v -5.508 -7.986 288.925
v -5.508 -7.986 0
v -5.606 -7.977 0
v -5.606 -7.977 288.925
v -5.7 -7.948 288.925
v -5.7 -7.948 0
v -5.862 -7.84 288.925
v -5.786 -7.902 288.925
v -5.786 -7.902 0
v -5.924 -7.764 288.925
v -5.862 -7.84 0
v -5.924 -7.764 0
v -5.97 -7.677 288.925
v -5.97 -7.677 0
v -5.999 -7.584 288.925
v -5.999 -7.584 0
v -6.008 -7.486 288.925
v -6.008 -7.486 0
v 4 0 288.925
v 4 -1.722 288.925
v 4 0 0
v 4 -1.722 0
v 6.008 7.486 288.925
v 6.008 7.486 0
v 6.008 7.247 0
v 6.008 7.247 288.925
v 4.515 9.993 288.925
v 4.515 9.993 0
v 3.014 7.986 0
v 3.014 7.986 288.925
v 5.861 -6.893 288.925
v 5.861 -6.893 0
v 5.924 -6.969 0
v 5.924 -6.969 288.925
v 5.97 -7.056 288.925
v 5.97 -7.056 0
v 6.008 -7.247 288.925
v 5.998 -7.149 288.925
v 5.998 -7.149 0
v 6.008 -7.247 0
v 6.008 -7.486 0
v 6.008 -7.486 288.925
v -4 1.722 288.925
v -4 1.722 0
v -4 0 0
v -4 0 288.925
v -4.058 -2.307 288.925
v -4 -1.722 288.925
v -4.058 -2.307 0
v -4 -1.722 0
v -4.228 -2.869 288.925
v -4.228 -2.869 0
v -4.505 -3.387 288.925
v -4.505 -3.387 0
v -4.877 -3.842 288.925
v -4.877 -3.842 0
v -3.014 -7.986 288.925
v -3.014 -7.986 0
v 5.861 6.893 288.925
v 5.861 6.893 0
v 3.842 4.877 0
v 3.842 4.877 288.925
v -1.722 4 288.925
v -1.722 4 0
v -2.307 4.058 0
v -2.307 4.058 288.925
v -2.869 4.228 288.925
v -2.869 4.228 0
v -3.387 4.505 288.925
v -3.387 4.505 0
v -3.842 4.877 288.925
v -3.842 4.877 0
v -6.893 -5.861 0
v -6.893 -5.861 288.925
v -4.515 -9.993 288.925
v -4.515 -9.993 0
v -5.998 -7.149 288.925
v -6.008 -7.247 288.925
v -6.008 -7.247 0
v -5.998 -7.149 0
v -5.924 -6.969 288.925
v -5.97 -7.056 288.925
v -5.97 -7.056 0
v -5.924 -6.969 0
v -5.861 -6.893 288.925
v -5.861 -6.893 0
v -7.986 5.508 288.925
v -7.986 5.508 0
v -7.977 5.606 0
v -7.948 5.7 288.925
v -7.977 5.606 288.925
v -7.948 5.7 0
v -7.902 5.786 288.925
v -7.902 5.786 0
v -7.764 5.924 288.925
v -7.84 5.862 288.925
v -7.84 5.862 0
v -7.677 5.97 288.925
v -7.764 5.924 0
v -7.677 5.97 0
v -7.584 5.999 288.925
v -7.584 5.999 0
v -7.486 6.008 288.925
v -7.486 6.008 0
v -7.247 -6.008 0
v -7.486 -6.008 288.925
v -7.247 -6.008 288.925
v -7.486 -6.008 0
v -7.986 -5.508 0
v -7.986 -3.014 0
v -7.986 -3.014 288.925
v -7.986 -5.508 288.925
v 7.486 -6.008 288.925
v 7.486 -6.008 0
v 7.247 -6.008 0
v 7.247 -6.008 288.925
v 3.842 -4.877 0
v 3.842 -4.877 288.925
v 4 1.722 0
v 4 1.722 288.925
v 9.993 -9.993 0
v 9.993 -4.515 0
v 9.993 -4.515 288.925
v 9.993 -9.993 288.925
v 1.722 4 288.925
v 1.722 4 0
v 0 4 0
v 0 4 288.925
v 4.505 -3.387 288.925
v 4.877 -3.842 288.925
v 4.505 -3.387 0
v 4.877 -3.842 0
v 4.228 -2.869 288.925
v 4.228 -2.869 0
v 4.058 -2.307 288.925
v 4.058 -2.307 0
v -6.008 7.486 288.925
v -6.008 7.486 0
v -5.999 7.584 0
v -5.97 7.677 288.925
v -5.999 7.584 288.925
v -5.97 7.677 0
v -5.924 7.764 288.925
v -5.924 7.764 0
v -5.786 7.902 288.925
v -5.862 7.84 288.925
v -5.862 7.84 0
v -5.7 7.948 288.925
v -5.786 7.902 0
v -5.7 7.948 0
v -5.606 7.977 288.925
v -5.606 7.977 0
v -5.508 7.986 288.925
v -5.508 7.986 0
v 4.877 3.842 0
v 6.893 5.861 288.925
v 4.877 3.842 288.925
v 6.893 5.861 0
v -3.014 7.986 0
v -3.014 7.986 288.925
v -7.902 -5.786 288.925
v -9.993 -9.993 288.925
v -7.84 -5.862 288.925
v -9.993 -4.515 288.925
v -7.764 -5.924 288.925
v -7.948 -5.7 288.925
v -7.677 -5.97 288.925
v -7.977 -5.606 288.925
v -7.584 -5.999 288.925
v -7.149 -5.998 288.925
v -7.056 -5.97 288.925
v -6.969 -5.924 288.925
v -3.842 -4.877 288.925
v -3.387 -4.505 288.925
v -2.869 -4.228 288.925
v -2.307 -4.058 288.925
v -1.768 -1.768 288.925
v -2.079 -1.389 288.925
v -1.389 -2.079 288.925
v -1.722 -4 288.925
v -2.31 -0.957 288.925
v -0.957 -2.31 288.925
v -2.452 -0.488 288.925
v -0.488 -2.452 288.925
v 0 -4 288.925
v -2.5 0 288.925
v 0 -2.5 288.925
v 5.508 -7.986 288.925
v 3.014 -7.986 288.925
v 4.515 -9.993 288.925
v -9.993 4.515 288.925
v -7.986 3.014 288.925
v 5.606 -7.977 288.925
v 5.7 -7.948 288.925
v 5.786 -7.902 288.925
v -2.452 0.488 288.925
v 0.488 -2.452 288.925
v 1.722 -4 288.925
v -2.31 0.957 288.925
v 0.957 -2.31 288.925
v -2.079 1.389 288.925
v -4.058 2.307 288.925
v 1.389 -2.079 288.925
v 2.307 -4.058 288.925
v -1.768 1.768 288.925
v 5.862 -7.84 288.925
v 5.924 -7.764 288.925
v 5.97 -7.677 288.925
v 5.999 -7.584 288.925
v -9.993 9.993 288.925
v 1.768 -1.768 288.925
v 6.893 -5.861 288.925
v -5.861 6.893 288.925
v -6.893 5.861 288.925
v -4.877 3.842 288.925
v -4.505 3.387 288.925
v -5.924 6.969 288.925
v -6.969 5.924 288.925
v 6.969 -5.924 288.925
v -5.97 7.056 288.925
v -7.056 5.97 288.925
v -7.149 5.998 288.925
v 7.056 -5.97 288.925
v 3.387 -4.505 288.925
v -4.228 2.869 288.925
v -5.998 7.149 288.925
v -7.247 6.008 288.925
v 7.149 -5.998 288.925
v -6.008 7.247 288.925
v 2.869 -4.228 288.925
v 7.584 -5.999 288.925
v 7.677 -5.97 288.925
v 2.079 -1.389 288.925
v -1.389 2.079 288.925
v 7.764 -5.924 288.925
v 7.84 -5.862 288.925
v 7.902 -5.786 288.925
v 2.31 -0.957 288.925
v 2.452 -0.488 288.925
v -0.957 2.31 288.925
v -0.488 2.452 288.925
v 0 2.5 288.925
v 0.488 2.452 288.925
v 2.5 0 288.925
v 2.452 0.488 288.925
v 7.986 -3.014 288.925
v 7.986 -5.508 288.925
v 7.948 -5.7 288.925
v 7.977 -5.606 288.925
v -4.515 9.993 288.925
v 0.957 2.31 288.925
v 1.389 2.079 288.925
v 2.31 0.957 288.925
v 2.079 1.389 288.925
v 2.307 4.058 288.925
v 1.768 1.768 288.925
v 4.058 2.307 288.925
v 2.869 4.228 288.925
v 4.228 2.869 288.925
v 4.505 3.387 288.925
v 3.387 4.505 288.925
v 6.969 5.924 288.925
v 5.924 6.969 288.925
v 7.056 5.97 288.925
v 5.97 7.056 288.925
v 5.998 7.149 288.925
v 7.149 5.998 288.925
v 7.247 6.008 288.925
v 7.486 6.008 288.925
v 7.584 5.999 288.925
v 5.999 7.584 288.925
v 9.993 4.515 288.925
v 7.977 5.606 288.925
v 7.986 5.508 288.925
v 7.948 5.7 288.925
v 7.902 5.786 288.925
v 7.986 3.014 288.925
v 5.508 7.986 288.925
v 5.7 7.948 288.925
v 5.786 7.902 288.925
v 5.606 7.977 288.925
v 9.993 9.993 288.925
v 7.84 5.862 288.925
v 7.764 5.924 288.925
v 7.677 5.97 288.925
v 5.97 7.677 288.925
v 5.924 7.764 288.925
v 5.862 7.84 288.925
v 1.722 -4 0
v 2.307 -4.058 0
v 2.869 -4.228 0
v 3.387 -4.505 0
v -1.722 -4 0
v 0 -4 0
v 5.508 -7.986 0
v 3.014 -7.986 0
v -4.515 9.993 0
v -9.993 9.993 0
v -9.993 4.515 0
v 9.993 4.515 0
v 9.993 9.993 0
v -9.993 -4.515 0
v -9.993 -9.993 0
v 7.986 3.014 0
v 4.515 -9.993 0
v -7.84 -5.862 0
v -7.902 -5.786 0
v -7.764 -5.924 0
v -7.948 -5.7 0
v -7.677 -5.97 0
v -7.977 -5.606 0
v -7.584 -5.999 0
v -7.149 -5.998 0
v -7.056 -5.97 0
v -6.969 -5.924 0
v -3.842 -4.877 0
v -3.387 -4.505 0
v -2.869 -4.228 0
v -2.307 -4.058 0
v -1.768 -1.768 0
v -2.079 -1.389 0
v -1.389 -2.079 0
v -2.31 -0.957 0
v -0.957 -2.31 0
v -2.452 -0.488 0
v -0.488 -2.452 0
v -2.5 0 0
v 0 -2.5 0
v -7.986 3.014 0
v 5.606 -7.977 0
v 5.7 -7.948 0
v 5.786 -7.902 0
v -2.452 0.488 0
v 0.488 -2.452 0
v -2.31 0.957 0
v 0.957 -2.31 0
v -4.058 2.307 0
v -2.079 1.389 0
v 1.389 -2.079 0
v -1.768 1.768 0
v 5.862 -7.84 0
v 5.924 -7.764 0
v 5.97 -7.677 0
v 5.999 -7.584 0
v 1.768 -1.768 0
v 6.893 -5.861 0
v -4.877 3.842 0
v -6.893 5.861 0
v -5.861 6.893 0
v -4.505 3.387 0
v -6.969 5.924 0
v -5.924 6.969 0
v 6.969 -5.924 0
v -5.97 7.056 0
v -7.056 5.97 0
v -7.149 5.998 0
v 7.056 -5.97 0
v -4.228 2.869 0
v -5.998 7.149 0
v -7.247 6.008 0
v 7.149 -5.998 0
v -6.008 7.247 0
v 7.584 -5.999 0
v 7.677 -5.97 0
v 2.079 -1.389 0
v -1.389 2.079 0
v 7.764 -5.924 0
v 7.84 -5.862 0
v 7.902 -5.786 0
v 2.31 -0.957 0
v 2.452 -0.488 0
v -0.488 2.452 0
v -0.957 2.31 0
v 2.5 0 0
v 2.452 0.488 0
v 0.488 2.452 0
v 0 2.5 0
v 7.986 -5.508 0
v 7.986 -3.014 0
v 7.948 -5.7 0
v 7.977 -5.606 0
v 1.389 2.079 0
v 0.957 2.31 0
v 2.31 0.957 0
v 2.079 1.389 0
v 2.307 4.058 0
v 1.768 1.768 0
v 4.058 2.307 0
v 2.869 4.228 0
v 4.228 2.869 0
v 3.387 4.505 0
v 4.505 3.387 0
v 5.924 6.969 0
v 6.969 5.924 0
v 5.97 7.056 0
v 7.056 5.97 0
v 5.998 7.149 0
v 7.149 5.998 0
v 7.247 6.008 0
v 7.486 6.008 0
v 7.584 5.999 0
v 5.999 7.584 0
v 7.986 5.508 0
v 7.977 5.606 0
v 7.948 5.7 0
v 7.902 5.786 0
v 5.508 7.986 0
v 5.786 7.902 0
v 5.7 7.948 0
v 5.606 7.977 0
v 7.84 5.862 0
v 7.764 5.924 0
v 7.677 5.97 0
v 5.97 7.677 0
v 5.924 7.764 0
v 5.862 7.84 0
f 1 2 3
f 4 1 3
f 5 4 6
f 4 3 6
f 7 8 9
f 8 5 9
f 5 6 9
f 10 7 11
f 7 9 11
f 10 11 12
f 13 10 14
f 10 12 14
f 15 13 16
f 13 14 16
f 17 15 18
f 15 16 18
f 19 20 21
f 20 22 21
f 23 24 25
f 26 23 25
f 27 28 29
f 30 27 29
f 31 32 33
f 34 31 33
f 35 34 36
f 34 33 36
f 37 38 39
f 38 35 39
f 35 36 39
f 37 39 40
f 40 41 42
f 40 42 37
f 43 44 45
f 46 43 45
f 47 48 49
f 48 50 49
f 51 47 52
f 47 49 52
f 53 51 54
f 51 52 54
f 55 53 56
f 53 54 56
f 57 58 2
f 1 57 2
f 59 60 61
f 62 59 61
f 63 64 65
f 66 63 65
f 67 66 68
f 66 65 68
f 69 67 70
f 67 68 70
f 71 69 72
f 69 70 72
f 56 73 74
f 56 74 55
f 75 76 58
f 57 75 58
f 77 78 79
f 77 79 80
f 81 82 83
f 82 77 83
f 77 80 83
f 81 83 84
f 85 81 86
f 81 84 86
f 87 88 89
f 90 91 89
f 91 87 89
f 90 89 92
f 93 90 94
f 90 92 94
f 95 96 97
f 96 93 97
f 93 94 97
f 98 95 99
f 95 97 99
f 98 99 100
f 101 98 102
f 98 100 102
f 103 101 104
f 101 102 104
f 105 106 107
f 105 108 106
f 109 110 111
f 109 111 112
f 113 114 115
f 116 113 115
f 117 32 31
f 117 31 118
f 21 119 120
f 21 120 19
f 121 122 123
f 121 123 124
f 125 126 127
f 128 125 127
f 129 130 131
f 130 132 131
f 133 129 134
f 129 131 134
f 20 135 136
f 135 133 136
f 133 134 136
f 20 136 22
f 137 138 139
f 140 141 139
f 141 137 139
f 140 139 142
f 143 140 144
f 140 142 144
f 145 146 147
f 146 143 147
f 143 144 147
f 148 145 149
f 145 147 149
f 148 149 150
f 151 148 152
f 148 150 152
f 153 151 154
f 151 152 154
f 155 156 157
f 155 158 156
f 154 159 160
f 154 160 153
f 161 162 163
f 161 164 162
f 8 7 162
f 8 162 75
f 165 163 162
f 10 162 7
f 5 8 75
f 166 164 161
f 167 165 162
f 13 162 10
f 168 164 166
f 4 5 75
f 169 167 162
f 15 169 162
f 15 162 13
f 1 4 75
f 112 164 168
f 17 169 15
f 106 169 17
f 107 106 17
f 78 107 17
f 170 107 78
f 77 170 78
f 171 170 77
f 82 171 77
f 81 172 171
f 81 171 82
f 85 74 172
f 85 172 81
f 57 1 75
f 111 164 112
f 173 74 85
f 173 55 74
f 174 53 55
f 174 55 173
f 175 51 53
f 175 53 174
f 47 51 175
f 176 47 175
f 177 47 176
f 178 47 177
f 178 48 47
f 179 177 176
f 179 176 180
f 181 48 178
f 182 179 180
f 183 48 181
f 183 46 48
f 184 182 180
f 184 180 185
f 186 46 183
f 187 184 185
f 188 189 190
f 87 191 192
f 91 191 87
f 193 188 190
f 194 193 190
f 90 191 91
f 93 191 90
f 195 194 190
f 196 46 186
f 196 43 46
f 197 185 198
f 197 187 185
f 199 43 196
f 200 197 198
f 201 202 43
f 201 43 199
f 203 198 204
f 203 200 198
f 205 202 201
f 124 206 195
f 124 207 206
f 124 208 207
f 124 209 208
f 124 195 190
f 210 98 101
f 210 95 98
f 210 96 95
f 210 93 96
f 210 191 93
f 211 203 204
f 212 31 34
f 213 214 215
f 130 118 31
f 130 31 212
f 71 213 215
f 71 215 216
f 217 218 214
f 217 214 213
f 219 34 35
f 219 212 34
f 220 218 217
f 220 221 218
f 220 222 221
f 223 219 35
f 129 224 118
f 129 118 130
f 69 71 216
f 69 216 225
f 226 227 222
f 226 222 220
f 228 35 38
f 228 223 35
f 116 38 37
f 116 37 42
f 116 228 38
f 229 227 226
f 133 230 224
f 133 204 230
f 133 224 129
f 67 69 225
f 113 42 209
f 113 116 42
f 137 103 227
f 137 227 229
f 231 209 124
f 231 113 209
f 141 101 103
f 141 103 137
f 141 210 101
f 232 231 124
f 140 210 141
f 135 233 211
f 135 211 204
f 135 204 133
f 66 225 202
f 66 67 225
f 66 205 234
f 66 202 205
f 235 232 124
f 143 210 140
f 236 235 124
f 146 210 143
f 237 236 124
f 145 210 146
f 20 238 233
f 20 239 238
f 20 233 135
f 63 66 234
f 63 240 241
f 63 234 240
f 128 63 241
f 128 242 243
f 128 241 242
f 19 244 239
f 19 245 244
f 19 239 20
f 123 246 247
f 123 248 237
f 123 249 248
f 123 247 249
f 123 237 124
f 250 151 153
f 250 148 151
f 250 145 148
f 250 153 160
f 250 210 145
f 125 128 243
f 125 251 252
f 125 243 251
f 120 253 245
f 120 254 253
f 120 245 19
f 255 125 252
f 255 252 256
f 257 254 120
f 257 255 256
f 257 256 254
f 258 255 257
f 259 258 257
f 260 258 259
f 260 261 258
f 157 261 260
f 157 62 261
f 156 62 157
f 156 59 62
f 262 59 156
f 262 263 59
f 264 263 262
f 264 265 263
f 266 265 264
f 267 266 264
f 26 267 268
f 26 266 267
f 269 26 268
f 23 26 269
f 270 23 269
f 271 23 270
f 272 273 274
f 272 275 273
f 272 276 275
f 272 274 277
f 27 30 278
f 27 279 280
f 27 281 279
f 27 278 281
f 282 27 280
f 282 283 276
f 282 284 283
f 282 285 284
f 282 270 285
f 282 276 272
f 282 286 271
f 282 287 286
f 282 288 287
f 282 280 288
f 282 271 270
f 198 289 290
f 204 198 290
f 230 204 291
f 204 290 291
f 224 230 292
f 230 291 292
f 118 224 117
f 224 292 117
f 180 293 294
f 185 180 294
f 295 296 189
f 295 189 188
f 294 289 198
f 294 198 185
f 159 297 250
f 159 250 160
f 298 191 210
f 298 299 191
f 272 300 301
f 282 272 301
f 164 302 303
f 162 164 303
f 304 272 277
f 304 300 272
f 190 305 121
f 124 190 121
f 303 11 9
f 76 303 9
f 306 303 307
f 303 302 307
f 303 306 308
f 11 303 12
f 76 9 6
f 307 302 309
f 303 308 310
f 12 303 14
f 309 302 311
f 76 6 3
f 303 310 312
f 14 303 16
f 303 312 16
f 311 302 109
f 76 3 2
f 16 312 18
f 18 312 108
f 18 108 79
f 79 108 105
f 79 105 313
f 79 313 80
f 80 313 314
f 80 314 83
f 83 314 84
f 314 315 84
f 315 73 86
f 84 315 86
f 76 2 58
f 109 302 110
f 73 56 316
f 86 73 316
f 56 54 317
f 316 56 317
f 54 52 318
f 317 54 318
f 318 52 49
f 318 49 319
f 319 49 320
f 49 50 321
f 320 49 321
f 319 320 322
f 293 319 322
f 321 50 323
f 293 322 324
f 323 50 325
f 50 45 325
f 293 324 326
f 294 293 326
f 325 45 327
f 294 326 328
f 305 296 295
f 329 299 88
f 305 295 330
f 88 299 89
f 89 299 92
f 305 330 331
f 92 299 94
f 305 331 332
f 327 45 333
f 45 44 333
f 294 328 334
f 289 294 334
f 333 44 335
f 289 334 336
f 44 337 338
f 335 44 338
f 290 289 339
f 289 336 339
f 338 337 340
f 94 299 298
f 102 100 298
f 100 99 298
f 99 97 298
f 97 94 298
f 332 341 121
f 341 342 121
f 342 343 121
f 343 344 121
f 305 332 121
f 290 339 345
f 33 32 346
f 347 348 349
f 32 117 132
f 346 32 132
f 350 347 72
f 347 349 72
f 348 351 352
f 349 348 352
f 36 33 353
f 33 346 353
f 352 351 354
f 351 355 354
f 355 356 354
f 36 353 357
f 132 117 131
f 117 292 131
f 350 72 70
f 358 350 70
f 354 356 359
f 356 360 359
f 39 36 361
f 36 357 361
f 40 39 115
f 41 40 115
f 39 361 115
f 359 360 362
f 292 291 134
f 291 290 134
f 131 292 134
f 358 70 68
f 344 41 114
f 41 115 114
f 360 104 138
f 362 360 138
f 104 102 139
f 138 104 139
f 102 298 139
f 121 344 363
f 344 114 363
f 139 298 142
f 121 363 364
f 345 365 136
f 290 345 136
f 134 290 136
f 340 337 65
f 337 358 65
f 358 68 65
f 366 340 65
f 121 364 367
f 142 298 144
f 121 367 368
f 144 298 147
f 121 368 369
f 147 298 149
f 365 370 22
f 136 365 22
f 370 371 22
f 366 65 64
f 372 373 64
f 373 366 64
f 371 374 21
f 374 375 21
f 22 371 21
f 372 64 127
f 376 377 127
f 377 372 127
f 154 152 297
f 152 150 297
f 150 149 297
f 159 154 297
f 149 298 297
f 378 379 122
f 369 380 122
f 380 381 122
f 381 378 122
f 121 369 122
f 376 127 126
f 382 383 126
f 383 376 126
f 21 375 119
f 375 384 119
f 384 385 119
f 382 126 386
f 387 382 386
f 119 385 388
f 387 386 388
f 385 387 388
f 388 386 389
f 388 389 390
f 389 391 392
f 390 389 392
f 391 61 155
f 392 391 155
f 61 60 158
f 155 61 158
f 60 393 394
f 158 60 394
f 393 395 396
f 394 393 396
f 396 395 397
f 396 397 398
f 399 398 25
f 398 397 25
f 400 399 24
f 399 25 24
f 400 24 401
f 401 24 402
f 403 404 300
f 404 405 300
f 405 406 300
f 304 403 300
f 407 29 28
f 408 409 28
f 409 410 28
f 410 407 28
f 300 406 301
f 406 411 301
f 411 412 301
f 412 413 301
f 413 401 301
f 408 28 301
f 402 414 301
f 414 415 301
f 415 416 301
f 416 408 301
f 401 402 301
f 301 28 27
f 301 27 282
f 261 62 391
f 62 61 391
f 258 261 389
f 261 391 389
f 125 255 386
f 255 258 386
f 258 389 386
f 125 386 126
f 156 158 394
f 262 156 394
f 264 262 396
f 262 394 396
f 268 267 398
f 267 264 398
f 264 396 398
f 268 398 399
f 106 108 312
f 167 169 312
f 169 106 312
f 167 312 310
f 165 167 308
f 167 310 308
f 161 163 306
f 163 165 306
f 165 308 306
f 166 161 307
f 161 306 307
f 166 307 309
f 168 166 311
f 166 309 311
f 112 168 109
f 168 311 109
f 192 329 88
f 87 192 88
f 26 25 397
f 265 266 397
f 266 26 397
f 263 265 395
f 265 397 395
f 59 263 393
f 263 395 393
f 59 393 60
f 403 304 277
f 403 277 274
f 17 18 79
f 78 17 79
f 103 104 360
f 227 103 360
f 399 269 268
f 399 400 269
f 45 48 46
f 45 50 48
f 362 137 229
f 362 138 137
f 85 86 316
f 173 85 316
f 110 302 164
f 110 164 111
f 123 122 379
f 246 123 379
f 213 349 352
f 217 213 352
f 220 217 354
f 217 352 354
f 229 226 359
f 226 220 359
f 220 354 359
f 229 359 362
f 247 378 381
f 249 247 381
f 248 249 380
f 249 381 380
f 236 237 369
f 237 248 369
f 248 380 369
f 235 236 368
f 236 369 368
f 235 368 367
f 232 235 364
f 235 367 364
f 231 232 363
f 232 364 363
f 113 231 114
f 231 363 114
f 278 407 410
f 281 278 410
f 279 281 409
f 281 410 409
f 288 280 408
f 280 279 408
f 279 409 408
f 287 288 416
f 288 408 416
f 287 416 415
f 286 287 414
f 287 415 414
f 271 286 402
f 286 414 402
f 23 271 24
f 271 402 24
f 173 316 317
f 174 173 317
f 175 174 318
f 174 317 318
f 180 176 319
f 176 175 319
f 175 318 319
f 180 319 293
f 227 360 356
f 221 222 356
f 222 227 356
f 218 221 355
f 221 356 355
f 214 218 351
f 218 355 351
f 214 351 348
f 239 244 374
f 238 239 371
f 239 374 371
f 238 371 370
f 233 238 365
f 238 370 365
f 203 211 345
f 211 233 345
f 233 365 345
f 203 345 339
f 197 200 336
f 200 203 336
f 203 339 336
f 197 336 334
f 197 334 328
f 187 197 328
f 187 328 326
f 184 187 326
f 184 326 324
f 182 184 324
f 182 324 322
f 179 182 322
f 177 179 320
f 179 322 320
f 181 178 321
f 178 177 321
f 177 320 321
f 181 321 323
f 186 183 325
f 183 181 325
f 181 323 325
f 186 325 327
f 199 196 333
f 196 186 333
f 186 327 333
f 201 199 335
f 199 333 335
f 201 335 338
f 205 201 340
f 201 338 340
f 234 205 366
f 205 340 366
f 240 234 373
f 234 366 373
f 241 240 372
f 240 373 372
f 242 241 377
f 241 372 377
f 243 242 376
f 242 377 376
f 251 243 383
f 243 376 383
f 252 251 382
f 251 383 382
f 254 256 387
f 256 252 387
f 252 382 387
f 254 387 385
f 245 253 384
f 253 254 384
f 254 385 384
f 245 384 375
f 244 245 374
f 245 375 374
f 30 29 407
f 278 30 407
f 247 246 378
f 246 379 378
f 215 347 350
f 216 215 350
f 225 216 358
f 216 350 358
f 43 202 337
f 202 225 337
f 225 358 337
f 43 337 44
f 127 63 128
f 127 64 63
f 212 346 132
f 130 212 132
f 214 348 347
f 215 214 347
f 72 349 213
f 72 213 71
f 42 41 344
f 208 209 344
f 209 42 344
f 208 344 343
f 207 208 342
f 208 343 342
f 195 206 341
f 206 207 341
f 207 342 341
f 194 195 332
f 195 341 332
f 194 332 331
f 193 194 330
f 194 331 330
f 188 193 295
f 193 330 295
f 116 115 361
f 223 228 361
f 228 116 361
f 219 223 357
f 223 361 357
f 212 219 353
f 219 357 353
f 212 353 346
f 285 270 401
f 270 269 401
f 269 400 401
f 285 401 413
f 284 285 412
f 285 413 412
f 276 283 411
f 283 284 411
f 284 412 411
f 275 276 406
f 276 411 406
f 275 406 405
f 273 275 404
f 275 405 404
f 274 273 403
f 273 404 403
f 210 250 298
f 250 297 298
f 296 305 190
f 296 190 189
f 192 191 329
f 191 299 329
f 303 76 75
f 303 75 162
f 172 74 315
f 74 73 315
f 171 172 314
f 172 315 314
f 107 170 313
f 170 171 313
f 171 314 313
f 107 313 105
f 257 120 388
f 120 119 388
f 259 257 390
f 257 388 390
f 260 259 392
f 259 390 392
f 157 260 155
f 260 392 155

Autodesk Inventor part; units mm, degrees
ref_plane "YZ Plane" through (0, 0, 0) normal (1, 0, 0) x (0, 1, 0)
ref_plane "XZ Plane" through (0, 0, 0) normal (0, 1, 0) x (-1, 0, 0)
ref_plane "XY Plane" through (0, 0, 0) normal (0, 0, 1) x (1, 0, 0)
sketch "Sketch1" plane through (0, 0, 0) normal (0, 0, 1) x (1, 0, 0)
  circle A0 centre (0, 0) radius 2.5
  line L0 (-9.9932, 4.515) -> (-7.9864, 3.0135)
  line L1 (-7.486, 6.0081) -> (-7.2469, 6.008)
  line L2 (-6.8934, 5.8613) -> (-4.8771, 3.8419)
  arc A1 (-6.8934, 5.8613) -> (-7.2469, 6.008) centre (-7.2472, 5.508) ccw
  circle A2 centre (0, 0) radius 2.5
  line L3 (-9.9932, 4.515) -> (-9.9932, 9.9932)
  line L4 (-7.9864, 3.0135) -> (-7.9864, 5.5081)
  arc A3 (-7.486, 6.0081) -> (-7.9864, 5.5081) centre (-7.4864, 5.5081) ccw
  line L5 (-4, 1.7222) -> (-4, 0)
  line L6 (-9.9932, -4.515) -> (-7.9864, -3.0135)
  line L7 (-6.8934, -5.8613) -> (-4.8771, -3.8419)
  arc A4 (-7.2469, -6.008) -> (-6.8934, -5.8613) centre (-7.2472, -5.508) ccw
  line L8 (-7.486, -6.0081) -> (-7.2469, -6.008)
  line L9 (-9.9932, -4.515) -> (-9.9932, -9.9932)
  line L10 (-7.9864, -3.0135) -> (-7.9864, -5.5081)
  arc A5 (-7.9864, -5.5081) -> (-7.486, -6.0081) centre (-7.4864, -5.5081) ccw
  line L11 (-4, -1.7222) -> (-4, 0)
  line L12 (9.9932, 4.515) -> (7.9864, 3.0135)
  line L13 (6.8934, 5.8613) -> (4.8771, 3.8419)
  arc A6 (7.2469, 6.008) -> (6.8934, 5.8613) centre (7.2472, 5.508) ccw
  line L14 (7.486, 6.0081) -> (7.2469, 6.008)
  line L15 (9.9932, 4.515) -> (9.9932, 9.9932)
  line L16 (7.9864, 3.0135) -> (7.9864, 5.5081)
  arc A7 (7.9864, 5.5081) -> (7.486, 6.0081) centre (7.4864, 5.5081) ccw
  line L17 (4, 1.7222) -> (4, 0)
  line L18 (9.9932, -4.515) -> (7.9864, -3.0135)
  line L19 (6.8934, -5.8613) -> (4.8771, -3.8419)
  arc A8 (6.8934, -5.8613) -> (7.2469, -6.008) centre (7.2472, -5.508) ccw
  line L20 (7.486, -6.0081) -> (7.2469, -6.008)
  line L21 (9.9932, -4.515) -> (9.9932, -9.9932)
  line L22 (7.9864, -3.0135) -> (7.9864, -5.5081)
  arc A9 (7.486, -6.0081) -> (7.9864, -5.5081) centre (7.4864, -5.5081) ccw
  line L23 (4, -1.7222) -> (4, 0)
  circle A10 centre (0, 0) radius 2.5
  line L24 (-4.515, -9.9932) -> (-3.0135, -7.9864)
  line L25 (-5.8613, -6.8934) -> (-3.8419, -4.8771)
  arc A11 (-5.8613, -6.8934) -> (-6.008, -7.2469) centre (-5.508, -7.2472) ccw
  line L26 (-6.0081, -7.486) -> (-6.008, -7.2469)
  circle A12 centre (0, 0) radius 2.5
  line L27 (-4.515, -9.9932) -> (-9.9932, -9.9932)
  line L28 (-3.0135, -7.9864) -> (-5.5081, -7.9864)
  arc A13 (-6.0081, -7.486) -> (-5.5081, -7.9864) centre (-5.5081, -7.4864) ccw
  line L29 (-1.7222, -4) -> (0, -4)
  line L30 (4.515, -9.9932) -> (3.0135, -7.9864)
  line L31 (5.8613, -6.8934) -> (3.8419, -4.8771)
  arc A14 (6.008, -7.2469) -> (5.8613, -6.8934) centre (5.508, -7.2472) ccw
  line L32 (6.0081, -7.486) -> (6.008, -7.2469)
  line L33 (4.515, -9.9932) -> (9.9932, -9.9932)
  line L34 (3.0135, -7.9864) -> (5.5081, -7.9864)
  arc A15 (5.5081, -7.9864) -> (6.0081, -7.486) centre (5.5081, -7.4864) ccw
  line L35 (1.7222, -4) -> (0, -4)
  line L36 (-1.7222, 4) -> (0, 4)
  line L37 (1.7222, 4) -> (0, 4)
  line L38 (5.8613, 6.8934) -> (3.8419, 4.8771)
  arc A16 (5.8613, 6.8934) -> (6.008, 7.2469) centre (5.508, 7.2472) ccw
  line L39 (6.0081, 7.486) -> (6.008, 7.2469)
  line L40 (3.0135, 7.9864) -> (5.5081, 7.9864)
  arc A17 (6.0081, 7.486) -> (5.5081, 7.9864) centre (5.5081, 7.4864) ccw
  line L41 (4.515, 9.9932) -> (3.0135, 7.9864)
  line L42 (4.515, 9.9932) -> (9.9932, 9.9932)
  line L43 (-5.8613, 6.8934) -> (-3.8419, 4.8771)
  arc A18 (-6.008, 7.2469) -> (-5.8613, 6.8934) centre (-5.508, 7.2472) ccw
  line L44 (-6.0081, 7.486) -> (-6.008, 7.2469)
  line L45 (-3.0135, 7.9864) -> (-5.5081, 7.9864)
  arc A19 (-5.5081, 7.9864) -> (-6.0081, 7.486) centre (-5.5081, 7.4864) ccw
  line L46 (-4.515, 9.9932) -> (-3.0135, 7.9864)
  line L47 (-4.515, 9.9932) -> (-9.9932, 9.9932)
  arc A20 (1.7222, 4) -> (3.8419, 4.8771) centre (1.7222, 7) ccw
  arc A21 (-3.8419, 4.8771) -> (-1.7222, 4) centre (-1.7222, 7) ccw
  arc A22 (-4, 1.7222) -> (-4.8771, 3.8419) centre (-7, 1.7222) ccw
  arc A23 (-4.8771, -3.8419) -> (-4, -1.7222) centre (-7, -1.7222) ccw
  arc A24 (-1.7222, -4) -> (-3.8419, -4.8771) centre (-1.7222, -7) ccw
  arc A25 (3.8419, -4.8771) -> (1.7222, -4) centre (1.7222, -7) ccw
  arc A26 (4, -1.7222) -> (4.8771, -3.8419) centre (7, -1.7222) ccw
  arc A27 (4.8771, 3.8419) -> (4, 1.7222) centre (7, 1.7222) ccw
  point P0 (-7.9864, 6.0085)
  point P1 (-7.9864, -6.0085)
  point P2 (7.9864, 6.0085)
  point P3 (7.9864, -6.0085)
  point P4 (-6.0085, -7.9864)
  point P5 (6.0085, -7.9864)
  point P6 (6.0085, 7.9864)
  point P7 (-6.0085, 7.9864)
extrude "Extrusion9" add sketch "Sketch1" along normal blind 288.925
properties part number "20mm_V-Rail_Extrusion Template" material "6105-T5 Aluminum"
